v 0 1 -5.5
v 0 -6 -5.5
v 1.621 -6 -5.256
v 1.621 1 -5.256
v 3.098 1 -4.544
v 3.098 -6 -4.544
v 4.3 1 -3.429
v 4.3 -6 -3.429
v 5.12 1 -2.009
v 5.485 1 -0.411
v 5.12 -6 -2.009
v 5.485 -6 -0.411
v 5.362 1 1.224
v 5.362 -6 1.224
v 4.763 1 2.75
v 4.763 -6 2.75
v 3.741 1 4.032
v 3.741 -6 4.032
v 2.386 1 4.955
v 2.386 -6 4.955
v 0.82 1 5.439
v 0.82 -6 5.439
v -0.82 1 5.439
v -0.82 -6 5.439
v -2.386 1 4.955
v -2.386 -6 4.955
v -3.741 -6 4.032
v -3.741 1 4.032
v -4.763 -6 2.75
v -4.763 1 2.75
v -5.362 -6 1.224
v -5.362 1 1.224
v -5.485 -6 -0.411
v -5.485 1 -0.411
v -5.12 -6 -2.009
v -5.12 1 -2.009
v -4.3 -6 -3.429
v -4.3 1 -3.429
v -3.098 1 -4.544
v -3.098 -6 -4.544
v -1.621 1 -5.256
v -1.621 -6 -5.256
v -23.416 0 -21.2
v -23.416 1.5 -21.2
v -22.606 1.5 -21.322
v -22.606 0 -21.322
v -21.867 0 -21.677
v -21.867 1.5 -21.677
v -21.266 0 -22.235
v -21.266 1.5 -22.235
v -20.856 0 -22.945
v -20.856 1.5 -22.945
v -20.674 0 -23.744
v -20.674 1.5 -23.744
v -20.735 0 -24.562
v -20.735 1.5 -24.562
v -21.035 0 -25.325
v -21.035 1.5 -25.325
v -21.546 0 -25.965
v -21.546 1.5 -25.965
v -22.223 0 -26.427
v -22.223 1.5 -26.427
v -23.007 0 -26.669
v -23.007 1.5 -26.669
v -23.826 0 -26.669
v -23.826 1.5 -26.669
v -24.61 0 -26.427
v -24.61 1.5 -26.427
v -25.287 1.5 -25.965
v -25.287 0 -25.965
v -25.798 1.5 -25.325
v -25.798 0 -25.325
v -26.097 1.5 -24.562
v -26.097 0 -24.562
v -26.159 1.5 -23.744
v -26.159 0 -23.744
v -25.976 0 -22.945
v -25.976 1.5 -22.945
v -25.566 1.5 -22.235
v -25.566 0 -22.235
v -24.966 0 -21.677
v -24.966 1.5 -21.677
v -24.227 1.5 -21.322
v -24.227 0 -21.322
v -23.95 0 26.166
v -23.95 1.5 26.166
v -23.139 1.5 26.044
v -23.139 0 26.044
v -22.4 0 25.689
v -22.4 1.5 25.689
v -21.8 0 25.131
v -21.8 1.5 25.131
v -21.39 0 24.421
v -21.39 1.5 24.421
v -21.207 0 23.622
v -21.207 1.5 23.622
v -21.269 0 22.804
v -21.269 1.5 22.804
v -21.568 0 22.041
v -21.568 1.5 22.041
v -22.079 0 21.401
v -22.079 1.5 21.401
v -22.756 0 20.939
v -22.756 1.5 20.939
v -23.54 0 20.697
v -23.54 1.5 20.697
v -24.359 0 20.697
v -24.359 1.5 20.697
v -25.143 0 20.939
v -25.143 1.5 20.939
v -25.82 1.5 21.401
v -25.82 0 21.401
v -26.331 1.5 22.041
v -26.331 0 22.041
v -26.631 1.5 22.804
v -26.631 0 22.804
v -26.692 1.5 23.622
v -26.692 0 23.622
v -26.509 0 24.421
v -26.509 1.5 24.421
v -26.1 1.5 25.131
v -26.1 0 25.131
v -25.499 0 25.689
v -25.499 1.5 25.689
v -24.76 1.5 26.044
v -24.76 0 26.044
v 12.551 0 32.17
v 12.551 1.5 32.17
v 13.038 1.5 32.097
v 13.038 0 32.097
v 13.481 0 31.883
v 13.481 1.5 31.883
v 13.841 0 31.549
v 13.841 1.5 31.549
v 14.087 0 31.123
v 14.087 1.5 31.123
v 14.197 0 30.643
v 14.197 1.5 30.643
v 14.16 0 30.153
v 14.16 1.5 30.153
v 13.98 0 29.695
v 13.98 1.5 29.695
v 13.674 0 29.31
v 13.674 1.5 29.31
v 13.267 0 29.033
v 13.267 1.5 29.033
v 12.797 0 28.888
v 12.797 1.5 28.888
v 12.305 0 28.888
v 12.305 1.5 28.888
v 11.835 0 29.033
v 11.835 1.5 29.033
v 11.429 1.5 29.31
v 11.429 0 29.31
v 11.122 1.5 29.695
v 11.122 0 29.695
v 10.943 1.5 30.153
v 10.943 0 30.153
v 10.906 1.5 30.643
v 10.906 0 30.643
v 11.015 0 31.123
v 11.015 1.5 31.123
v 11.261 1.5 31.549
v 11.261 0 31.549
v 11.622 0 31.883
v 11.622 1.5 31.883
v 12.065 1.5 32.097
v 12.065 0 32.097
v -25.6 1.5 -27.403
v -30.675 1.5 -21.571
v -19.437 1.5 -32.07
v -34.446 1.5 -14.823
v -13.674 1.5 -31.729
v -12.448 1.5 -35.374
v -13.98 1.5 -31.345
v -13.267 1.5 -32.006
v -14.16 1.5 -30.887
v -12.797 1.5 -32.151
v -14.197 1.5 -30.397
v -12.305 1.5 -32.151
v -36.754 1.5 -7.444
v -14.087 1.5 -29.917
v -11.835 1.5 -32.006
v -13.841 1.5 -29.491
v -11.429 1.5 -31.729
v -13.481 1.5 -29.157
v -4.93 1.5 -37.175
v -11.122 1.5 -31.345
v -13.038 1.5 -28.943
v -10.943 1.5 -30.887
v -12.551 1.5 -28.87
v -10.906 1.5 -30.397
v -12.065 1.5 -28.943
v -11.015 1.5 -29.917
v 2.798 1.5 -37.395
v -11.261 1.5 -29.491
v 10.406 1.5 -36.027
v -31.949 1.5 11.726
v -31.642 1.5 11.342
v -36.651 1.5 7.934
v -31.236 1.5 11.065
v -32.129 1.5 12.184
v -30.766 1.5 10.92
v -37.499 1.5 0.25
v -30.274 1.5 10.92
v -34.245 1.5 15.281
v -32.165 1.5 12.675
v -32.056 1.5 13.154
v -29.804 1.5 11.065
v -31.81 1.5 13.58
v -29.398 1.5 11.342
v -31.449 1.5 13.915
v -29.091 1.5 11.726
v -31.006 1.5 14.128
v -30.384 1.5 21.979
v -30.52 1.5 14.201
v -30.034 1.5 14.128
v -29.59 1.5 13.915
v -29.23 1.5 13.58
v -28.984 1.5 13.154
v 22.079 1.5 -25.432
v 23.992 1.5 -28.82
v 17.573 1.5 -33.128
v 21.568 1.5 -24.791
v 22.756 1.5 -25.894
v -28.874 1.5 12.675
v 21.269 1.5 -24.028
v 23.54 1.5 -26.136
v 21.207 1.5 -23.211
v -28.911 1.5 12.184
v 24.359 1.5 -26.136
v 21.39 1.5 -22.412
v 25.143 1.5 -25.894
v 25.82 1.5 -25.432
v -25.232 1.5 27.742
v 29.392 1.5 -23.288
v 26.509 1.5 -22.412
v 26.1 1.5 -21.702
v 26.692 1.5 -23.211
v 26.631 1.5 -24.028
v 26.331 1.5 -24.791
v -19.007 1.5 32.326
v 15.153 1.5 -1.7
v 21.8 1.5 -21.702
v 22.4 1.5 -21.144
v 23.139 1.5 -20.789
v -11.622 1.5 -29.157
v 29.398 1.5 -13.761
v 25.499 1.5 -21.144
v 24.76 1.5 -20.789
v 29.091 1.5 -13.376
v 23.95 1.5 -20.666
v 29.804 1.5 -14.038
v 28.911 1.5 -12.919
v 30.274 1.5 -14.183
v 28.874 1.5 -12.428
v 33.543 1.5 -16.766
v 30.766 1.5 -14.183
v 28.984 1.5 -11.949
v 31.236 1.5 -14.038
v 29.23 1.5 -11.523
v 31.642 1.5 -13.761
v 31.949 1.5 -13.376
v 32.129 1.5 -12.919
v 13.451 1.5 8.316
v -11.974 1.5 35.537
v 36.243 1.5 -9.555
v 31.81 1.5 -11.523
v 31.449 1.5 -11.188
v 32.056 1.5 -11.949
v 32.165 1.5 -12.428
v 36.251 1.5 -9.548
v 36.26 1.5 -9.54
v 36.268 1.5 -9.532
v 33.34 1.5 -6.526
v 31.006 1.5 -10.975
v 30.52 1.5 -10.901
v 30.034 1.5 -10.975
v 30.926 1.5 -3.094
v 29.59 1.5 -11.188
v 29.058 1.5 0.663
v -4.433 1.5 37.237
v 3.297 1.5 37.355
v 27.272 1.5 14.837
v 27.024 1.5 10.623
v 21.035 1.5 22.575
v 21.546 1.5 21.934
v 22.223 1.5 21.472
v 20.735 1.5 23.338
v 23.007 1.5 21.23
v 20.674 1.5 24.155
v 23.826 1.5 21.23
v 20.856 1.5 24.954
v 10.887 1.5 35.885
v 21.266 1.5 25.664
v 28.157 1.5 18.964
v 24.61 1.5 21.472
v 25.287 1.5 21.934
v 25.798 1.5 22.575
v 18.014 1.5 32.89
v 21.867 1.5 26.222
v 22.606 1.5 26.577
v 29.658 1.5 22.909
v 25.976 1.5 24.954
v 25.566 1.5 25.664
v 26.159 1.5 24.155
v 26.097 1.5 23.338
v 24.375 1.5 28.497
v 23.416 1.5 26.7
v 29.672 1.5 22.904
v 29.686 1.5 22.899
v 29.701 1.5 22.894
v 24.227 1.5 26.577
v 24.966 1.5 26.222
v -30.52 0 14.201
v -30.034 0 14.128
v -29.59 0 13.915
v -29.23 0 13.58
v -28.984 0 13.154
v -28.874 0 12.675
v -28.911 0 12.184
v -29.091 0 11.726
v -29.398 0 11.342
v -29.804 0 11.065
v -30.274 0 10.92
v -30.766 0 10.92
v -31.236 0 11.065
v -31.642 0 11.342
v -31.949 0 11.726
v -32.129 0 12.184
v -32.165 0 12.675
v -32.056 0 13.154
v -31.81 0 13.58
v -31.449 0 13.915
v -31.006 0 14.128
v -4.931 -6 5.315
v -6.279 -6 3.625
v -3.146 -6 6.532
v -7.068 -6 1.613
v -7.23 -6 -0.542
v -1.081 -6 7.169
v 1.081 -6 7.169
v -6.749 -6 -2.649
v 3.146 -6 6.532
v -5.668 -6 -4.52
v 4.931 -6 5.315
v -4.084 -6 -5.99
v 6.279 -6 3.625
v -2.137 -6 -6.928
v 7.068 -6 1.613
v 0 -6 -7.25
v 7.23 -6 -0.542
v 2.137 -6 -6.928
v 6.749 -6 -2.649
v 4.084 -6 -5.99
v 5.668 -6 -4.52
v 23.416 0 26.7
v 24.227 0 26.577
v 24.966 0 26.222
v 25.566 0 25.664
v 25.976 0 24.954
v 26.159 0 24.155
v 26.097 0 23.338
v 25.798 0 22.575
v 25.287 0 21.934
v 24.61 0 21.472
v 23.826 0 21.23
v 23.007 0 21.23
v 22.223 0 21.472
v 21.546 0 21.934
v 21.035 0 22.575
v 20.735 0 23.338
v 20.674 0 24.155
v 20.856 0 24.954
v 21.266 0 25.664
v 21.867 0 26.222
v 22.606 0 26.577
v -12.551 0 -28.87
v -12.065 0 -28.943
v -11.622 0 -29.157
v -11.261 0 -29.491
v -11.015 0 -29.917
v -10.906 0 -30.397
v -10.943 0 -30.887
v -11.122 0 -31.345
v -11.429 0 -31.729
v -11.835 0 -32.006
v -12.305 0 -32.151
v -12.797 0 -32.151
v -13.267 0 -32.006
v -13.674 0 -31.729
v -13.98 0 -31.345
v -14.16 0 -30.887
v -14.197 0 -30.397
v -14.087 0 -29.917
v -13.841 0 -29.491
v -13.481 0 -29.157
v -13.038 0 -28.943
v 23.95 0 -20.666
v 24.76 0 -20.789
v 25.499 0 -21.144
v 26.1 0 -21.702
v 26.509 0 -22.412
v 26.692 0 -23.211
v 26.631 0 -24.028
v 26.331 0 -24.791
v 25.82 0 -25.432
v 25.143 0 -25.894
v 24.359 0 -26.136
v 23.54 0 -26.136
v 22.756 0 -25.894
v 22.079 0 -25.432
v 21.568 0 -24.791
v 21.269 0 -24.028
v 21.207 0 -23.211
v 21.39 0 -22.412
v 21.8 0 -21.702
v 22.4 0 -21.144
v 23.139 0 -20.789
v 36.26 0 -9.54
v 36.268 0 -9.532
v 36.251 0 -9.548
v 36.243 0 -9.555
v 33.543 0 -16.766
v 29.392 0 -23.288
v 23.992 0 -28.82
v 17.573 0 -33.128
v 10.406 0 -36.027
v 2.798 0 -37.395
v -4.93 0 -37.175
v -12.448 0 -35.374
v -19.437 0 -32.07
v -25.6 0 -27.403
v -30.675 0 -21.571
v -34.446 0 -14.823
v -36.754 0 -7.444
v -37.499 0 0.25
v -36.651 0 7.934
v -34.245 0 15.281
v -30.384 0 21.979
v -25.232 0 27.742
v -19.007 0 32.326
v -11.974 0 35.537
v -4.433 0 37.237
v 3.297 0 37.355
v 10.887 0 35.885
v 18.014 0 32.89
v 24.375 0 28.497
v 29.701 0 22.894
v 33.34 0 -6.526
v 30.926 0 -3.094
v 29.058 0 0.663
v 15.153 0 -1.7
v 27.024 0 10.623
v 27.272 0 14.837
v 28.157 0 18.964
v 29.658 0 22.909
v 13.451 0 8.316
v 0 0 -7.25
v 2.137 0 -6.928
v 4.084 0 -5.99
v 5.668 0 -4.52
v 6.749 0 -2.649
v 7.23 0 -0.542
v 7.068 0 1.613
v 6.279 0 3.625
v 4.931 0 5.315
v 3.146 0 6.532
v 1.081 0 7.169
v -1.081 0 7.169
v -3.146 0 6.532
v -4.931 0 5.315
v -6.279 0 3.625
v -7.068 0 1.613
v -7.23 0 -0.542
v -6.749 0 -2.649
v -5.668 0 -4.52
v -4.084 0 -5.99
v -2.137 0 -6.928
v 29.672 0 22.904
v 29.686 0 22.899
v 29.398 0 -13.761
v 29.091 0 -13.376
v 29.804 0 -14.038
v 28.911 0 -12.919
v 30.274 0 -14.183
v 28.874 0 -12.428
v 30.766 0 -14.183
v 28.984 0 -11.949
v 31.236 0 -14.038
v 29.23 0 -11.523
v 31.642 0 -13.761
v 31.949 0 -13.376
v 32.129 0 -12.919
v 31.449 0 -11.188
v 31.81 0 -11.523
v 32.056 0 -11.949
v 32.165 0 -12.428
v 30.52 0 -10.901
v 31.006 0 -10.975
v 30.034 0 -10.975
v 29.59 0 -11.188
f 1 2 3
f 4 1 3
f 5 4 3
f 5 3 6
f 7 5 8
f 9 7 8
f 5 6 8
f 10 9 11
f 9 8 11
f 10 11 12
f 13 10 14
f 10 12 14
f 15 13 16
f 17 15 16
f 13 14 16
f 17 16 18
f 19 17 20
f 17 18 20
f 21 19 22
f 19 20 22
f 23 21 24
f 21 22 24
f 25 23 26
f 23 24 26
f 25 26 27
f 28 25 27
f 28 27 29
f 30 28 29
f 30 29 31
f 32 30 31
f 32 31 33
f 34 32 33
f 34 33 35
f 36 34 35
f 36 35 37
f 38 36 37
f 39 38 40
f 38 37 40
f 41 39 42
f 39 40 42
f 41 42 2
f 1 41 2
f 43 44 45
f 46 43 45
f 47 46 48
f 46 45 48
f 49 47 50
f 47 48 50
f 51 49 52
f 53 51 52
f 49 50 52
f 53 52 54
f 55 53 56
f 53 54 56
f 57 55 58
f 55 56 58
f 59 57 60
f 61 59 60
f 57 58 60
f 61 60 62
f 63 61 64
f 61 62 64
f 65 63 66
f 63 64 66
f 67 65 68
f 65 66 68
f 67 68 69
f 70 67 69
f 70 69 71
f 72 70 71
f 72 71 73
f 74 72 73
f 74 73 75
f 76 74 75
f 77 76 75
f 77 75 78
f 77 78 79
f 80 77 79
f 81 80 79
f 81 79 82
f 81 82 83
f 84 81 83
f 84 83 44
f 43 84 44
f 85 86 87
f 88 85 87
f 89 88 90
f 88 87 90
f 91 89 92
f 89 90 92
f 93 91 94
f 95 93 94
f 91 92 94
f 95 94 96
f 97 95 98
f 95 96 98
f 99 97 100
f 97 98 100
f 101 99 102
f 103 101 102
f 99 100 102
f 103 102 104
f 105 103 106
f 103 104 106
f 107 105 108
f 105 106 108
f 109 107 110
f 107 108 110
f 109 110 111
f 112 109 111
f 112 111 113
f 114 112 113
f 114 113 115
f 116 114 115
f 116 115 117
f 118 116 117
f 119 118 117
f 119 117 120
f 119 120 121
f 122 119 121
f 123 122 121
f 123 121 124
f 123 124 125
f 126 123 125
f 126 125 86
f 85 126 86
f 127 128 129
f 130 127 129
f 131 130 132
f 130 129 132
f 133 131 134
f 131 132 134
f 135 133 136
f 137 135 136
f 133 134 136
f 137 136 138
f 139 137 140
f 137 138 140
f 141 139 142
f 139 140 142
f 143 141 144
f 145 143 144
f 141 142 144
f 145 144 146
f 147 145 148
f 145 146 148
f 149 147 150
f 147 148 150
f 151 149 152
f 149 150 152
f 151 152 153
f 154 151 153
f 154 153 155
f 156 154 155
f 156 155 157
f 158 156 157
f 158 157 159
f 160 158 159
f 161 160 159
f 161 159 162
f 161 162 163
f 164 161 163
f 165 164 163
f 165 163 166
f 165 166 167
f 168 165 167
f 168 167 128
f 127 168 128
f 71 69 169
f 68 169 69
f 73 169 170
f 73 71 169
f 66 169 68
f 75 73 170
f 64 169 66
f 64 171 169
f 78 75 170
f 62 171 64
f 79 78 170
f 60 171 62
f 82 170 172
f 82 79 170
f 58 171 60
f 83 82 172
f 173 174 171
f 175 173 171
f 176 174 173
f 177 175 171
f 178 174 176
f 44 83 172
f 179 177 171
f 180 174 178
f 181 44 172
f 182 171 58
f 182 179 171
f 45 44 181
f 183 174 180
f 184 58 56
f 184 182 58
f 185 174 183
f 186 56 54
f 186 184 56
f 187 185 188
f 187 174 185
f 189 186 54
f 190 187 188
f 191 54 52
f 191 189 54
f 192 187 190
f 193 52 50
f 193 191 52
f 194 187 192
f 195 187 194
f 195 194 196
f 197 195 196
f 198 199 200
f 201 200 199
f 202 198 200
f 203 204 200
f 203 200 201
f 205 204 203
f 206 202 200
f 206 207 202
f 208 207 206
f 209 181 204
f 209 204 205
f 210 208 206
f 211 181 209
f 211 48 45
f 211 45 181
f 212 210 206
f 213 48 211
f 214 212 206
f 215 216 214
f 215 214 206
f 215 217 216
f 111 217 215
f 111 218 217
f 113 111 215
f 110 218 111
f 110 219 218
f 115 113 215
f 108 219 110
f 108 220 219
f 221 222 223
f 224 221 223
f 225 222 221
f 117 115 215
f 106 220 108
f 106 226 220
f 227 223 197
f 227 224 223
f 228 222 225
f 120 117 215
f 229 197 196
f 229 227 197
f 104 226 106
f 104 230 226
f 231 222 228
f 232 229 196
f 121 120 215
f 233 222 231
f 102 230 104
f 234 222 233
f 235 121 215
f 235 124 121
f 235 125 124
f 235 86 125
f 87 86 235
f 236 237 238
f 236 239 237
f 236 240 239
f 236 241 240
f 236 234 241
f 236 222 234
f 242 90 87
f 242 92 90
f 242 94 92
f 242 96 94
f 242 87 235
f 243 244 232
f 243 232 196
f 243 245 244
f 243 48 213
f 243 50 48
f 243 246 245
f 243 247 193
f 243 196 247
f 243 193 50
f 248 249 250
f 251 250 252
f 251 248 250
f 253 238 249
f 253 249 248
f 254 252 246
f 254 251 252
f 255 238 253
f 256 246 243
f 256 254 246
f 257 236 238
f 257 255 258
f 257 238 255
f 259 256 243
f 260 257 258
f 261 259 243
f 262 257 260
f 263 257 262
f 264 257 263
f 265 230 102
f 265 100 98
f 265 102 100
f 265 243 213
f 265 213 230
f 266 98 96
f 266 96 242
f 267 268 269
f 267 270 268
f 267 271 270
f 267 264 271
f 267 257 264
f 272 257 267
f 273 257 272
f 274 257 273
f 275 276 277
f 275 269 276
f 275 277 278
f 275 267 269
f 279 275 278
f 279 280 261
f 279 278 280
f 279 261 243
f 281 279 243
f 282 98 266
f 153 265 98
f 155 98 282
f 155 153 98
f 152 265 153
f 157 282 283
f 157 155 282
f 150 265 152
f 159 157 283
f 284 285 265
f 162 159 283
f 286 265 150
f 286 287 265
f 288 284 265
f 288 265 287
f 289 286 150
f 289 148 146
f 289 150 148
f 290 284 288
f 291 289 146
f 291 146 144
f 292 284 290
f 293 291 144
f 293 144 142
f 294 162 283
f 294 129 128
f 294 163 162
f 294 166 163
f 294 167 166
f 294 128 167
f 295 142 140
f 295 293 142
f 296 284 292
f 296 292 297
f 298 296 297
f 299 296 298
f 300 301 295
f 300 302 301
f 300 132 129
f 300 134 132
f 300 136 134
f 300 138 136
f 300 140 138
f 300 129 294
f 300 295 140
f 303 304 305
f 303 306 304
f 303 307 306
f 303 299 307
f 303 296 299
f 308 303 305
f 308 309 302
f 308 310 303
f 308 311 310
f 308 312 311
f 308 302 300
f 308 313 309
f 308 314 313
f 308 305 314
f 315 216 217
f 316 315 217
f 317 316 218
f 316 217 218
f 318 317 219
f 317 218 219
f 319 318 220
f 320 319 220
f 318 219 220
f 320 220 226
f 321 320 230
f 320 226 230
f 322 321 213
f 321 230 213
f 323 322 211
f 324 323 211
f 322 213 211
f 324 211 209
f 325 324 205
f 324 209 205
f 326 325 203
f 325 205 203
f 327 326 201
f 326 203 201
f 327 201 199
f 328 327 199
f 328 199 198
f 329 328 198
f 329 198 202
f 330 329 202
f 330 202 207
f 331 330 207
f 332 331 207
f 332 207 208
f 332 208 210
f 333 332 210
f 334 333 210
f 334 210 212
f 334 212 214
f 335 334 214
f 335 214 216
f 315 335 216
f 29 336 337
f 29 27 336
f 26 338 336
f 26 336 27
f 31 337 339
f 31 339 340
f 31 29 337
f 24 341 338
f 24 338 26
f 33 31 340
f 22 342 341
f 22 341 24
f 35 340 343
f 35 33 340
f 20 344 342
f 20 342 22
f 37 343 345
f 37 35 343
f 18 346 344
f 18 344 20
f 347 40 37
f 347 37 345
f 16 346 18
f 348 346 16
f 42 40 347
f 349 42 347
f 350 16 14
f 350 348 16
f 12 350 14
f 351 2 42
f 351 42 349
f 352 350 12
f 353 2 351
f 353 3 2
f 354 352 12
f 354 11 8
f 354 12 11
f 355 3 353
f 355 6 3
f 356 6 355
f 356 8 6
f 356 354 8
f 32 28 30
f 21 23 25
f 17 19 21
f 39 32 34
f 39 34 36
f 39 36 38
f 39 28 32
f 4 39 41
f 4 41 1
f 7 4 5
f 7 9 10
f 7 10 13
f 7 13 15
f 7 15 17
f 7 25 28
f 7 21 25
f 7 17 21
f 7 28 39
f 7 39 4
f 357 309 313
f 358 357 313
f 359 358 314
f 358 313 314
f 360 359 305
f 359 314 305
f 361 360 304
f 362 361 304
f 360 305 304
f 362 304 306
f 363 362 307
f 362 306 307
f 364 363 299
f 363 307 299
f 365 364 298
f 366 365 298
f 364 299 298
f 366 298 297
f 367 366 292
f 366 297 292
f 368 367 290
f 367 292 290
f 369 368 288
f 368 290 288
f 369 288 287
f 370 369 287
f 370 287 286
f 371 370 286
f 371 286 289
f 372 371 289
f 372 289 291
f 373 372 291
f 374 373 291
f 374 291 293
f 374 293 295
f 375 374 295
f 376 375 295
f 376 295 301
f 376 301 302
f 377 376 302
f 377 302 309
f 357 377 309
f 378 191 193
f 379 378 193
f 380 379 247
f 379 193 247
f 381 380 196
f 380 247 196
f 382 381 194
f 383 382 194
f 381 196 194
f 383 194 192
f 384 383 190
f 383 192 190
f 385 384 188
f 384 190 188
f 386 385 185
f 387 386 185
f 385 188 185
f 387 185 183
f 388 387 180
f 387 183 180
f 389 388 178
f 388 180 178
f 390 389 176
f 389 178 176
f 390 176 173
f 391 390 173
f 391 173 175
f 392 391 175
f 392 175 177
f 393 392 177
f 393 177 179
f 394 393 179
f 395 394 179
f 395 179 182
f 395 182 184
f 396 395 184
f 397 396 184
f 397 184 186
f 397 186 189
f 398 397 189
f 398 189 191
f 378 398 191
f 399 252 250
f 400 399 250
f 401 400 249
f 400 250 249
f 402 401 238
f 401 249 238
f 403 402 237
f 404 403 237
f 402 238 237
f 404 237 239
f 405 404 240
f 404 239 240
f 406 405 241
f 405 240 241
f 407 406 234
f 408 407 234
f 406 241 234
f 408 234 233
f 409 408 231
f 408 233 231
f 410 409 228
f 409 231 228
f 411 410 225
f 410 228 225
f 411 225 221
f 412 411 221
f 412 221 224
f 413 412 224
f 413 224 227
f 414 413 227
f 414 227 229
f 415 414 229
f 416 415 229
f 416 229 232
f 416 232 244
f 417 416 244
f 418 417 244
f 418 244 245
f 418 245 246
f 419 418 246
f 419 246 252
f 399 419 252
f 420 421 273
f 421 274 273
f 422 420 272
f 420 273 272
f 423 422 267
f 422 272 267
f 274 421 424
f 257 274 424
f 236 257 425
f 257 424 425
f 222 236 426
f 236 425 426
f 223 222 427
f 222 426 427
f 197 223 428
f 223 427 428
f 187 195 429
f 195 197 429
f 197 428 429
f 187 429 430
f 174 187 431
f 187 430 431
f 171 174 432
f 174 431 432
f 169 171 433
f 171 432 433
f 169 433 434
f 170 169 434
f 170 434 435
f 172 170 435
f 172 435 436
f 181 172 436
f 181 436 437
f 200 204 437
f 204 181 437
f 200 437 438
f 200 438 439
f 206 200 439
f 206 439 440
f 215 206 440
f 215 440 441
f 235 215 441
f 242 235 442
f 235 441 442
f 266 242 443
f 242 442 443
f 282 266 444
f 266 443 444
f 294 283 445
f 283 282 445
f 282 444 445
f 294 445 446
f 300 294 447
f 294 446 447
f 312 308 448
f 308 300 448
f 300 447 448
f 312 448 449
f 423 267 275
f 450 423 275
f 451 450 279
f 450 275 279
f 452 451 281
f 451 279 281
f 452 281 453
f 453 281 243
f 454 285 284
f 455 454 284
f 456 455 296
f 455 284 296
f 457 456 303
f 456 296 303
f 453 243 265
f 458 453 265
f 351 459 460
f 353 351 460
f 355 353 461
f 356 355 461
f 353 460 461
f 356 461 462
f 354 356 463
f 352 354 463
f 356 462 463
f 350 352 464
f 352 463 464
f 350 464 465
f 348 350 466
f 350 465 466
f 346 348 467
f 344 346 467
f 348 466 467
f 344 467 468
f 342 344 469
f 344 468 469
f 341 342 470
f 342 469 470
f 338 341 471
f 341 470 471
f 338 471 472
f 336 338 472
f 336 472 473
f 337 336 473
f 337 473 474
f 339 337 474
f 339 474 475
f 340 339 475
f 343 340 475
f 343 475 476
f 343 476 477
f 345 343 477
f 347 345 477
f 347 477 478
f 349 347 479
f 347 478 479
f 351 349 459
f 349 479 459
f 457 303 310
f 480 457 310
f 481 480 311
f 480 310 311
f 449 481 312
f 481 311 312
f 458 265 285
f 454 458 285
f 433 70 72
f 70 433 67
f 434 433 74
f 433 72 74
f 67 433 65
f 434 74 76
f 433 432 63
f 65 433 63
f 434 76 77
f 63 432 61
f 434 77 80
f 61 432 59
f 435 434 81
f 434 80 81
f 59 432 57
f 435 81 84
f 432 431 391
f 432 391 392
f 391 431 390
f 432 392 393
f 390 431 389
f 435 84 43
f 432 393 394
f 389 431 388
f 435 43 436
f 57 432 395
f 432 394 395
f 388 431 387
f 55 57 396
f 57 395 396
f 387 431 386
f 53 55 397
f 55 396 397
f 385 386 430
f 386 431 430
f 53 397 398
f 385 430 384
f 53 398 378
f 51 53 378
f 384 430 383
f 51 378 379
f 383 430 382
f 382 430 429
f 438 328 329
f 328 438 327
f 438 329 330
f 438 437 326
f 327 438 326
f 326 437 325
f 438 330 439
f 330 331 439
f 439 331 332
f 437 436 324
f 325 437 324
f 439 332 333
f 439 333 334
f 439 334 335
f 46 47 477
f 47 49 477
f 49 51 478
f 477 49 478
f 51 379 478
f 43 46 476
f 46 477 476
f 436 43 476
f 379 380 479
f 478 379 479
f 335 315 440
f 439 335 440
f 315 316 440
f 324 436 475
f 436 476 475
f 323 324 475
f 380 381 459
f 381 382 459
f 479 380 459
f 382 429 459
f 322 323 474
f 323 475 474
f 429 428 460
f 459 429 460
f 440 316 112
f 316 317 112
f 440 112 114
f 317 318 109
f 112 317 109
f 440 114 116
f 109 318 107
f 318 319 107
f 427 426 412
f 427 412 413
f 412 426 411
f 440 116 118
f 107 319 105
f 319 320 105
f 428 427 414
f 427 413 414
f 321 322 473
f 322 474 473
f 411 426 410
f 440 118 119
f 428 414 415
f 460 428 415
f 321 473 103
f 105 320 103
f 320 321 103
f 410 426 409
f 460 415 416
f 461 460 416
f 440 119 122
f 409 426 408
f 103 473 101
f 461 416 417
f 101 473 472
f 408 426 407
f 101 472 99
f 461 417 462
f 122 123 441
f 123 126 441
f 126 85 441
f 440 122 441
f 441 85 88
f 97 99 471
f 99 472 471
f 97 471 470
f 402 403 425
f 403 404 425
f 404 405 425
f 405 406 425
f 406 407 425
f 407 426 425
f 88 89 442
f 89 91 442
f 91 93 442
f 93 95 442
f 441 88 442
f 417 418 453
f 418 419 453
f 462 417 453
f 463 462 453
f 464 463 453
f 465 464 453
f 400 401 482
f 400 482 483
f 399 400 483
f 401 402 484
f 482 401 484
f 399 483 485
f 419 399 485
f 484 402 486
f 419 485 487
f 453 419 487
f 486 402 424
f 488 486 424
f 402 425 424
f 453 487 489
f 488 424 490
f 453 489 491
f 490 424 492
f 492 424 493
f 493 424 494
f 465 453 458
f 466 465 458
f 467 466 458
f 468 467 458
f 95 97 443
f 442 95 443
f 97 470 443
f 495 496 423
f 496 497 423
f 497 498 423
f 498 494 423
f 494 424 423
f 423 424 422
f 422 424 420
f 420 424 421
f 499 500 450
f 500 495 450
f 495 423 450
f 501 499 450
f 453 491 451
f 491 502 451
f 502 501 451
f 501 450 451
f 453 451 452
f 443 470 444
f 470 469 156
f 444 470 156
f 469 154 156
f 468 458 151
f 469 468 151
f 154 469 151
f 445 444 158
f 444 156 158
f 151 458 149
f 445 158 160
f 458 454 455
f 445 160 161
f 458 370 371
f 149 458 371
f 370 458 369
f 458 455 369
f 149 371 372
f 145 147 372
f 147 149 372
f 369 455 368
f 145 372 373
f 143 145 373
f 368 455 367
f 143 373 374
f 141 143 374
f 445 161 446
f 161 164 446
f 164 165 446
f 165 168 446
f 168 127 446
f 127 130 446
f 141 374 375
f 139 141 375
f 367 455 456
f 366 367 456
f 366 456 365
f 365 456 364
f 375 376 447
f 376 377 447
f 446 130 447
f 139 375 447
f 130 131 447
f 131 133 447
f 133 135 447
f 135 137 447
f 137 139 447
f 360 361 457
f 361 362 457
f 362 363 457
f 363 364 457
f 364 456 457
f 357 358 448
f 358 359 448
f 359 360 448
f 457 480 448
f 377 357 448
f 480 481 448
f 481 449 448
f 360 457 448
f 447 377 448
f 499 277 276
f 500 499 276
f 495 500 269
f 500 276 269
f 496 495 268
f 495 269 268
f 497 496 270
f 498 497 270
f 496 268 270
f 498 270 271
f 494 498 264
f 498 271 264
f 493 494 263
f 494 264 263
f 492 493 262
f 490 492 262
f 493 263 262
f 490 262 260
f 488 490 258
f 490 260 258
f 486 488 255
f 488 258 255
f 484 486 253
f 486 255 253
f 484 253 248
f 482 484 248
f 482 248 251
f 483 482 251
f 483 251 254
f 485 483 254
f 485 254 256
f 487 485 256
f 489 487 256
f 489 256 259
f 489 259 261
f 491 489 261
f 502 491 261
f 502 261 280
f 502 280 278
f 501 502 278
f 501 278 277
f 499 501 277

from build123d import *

# Parameters (mm, degrees)
SKETCH1_R           = 37.5
BOSS_EXTRUDE1_DEPTH = 1.5
SKETCH4_R           = 7.25
BOSS_EXTRUDE2_DEPTH = 6
SKETCH5_R           = 5.5
CUT_EXTRUDE2_DEPTH  = 7
SKETCH8_R           = 2.75
SKETCH8_R_2         = 1.65
CUT_EXTRUDE3_DEPTH  = 10
CUT_EXTRUDE5_DEPTH  = 5


with BuildPart() as part:
    # Sketch1 → Boss-Extrude1 (new body)
    with BuildSketch(Plane(origin=(0, 0, 0), x_dir=(1, 0, 0), z_dir=(0, 1, 0))):
        with Locations(Location((0, 0, 0), (0, 0, 270))):
            Circle(SKETCH1_R)
    extrude(amount=BOSS_EXTRUDE1_DEPTH)

    # Sketch4 → Boss-Extrude2 (add)
    with BuildSketch(Plane.XZ):
        with Locations(Location((0, 0, 0), (0, 0, 270))):
            Circle(SKETCH4_R)
    extrude(amount=BOSS_EXTRUDE2_DEPTH)

    # Sketch5 → Cut-Extrude2 (cut)
    with BuildSketch(Plane.XZ.offset(6)):
        with Locations(Location((0, 0, 0), (0, 0, 270))):
            Circle(SKETCH5_R)
    extrude(amount=-CUT_EXTRUDE2_DEPTH, mode=Mode.SUBTRACT)

    # Sketch8 → Cut-Extrude3 (cut)
    with BuildSketch(Plane(origin=(0, 1.5, 0), x_dir=(1, 0, 0), z_dir=(0, 1, 0))):
        with Locations(Location((-23.416394486, 23.949580961, 0), (0, 0, 270))):
            Circle(SKETCH8_R)
        with Locations(Location((23.949580961, 23.416394486, 0), (0, 0, 270))):
            Circle(SKETCH8_R)
        with Locations(Location((23.416394486, -23.949580961, 0), (0, 0, 270))):
            Circle(SKETCH8_R)
        with Locations(Location((-23.949580961, -23.416394486, 0), (0, 0, 270))):
            Circle(SKETCH8_R)
        with Locations(Location((-30.519872414, -12.551389877, 0), (0, 0, 270))):
            Circle(SKETCH8_R_2)
        with Locations(Location((-12.551389877, 30.519872414, 0), (0, 0, 270))):
            Circle(SKETCH8_R_2)
        with Locations(Location((30.519872414, 12.551389878, 0), (0, 0, 270))):
            Circle(SKETCH8_R_2)
        with Locations(Location((12.551389878, -30.519872414, 0), (0, 0, 270))):
            Circle(SKETCH8_R_2)
    extrude(amount=-CUT_EXTRUDE3_DEPTH, mode=Mode.SUBTRACT)

    # Sketch9 → Cut-Extrude5 (cut, symmetric)
    with BuildSketch(Plane(origin=(0, 1.5, 0), x_dir=(1, 0, 0), z_dir=(0, 1, 0))):
        with BuildLine():
            Line((15.152911059, 1.700080088), (13.450685177, -8.316302683))
            Line((13.450685177, -8.316302683), (27.023681414, -10.622954298))
            ThreePointArc((27.023681414, -10.622954298), (27.636041802, -16.917145139), (29.657895546, -22.909134042))
            ThreePointArc((29.657895546, -22.909134042), (42.084378473, -8.529589687), (36.242968745, 9.555395969))
            ThreePointArc((36.242968745, 9.555395969), (32.067942495, 4.855826196), (29.0581189, -0.663028953))
            Line((29.0581189, -0.663028953), (15.152911059, 1.700080088))
        make_face()
    extrude(amount=CUT_EXTRUDE5_DEPTH, both=True, mode=Mode.SUBTRACT)


solid = part.part
